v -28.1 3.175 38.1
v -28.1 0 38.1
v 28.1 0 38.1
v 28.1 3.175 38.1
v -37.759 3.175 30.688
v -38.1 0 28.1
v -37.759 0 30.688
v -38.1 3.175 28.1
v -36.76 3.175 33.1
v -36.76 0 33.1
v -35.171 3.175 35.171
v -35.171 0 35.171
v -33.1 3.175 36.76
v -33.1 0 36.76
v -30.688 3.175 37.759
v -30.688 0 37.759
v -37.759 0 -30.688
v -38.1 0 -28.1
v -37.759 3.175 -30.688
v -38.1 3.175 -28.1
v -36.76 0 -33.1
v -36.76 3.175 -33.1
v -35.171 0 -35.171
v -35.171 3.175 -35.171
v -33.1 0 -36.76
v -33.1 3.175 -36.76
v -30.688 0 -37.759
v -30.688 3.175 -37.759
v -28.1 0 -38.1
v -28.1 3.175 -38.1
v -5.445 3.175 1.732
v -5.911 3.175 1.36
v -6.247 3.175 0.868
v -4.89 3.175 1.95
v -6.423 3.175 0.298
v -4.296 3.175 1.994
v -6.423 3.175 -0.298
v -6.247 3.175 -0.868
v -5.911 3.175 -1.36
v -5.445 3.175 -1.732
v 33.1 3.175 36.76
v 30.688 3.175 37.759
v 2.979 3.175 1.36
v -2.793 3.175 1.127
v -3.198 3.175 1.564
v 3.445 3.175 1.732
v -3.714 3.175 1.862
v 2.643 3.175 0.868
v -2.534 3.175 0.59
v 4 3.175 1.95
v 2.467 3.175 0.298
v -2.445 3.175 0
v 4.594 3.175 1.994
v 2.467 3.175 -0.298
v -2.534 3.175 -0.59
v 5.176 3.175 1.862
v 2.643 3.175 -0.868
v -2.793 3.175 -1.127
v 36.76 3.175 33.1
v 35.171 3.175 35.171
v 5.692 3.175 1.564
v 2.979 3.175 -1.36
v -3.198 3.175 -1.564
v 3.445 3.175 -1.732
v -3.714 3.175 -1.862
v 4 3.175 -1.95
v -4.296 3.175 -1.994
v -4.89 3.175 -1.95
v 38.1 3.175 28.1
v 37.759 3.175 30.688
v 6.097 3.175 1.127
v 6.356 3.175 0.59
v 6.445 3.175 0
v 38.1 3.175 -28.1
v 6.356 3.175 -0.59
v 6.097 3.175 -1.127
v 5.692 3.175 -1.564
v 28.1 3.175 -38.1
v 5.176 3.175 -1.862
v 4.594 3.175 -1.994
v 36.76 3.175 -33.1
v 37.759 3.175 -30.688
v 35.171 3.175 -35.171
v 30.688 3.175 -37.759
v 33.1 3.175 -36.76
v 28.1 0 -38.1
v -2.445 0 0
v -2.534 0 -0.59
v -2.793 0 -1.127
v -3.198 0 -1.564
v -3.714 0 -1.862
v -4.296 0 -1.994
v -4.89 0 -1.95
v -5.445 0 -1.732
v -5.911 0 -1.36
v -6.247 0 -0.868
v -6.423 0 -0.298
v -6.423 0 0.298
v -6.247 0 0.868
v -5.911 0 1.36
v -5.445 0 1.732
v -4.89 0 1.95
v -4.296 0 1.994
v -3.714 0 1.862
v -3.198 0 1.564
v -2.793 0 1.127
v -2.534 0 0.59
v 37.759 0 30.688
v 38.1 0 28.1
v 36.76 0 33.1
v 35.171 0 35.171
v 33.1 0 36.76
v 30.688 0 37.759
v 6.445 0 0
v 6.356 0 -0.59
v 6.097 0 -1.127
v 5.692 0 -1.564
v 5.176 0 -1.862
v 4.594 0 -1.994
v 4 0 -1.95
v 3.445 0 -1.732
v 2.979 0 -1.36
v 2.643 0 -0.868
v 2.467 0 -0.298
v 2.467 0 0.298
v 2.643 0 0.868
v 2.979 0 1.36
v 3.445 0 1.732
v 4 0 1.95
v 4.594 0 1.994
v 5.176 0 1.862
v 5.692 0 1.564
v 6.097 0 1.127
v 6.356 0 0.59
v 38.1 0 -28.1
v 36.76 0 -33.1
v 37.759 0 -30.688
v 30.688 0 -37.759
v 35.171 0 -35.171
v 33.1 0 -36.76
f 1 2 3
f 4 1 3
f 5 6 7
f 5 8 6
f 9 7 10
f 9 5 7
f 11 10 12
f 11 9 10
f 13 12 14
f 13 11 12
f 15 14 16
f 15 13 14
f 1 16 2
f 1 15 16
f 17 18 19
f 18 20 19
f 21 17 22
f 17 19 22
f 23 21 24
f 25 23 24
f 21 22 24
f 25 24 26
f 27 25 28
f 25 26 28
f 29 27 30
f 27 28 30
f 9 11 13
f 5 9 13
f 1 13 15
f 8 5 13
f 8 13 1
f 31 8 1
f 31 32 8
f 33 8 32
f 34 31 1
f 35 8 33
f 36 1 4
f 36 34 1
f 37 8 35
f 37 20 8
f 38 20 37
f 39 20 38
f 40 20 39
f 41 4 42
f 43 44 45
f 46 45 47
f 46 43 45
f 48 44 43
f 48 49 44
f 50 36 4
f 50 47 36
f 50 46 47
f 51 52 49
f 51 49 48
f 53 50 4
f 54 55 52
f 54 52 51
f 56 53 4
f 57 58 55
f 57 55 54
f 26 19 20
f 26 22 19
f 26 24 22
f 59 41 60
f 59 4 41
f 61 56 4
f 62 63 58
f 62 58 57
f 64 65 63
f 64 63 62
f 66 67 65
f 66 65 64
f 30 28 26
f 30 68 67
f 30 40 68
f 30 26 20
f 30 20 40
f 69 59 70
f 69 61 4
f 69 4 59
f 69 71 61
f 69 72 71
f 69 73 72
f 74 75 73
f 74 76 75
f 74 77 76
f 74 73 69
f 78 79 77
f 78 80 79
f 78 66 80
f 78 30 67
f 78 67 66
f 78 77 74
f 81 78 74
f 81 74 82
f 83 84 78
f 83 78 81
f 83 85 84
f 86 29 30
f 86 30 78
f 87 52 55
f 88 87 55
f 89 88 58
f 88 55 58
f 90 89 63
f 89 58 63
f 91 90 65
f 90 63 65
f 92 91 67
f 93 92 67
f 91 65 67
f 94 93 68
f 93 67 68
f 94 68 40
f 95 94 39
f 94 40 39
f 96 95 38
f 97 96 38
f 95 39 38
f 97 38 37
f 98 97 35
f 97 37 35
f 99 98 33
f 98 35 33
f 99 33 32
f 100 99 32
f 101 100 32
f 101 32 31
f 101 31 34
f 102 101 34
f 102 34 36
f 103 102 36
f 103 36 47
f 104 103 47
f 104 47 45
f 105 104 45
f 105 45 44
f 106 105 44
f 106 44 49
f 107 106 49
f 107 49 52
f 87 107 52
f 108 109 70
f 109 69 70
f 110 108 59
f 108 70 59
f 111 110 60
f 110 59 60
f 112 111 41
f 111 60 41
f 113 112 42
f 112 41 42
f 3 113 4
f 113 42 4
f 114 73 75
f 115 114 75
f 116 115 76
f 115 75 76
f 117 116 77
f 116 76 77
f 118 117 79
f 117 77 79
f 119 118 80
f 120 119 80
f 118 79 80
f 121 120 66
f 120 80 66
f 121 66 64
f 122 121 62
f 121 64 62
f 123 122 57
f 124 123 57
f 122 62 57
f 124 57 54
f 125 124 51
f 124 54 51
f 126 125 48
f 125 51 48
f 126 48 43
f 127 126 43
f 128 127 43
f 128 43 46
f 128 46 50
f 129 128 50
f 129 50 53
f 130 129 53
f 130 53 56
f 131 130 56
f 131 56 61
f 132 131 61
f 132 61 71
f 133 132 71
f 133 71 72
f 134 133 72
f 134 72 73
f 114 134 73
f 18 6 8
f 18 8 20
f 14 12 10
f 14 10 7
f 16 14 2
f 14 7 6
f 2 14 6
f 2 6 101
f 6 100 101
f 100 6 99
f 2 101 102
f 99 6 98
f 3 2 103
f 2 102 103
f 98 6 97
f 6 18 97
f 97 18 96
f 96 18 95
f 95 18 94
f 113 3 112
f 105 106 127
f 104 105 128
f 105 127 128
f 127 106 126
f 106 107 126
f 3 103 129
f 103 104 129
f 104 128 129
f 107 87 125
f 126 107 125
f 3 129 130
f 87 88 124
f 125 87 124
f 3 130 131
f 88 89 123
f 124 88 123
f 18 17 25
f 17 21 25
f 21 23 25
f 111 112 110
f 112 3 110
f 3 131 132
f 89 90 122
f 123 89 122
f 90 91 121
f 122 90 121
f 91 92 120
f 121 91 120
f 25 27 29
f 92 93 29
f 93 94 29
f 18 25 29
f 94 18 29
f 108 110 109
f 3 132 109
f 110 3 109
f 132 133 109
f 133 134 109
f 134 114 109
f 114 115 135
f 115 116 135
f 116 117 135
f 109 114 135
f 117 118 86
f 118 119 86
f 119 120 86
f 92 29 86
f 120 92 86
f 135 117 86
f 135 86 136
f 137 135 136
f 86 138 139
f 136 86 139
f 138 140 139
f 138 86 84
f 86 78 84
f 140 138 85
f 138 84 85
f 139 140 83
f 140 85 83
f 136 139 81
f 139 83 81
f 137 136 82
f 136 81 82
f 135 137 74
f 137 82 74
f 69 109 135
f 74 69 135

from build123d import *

# Parameters (mm, degrees)
SKETCH1_W           = 76.2
SKETCH1_H           = 76.2
BOSS_EXTRUDE1_DEPTH = 3.175
FILLET1_R           = 10
FILLET2_R           = 10
FILLET3_R           = 10
FILLET4_R           = 10
SKETCH2_R           = 2
CUT_EXTRUDE1_DEPTH  = 4.175


with BuildPart() as part:
    # Sketch1 → Boss-Extrude1 (new body)
    with BuildSketch(Plane(origin=(0, 0, 0), x_dir=(1, 0, 0), z_dir=(0, 1, 0))):
        Rectangle(SKETCH1_W, SKETCH1_H)
    extrude(amount=BOSS_EXTRUDE1_DEPTH)

    # Fillet1
    fillet1_edges = [part.edges().sort_by_distance(p)[0] for p in [
        (-38.1, 1.5875, 38.1),
    ]]
    fillet(fillet1_edges, radius=FILLET1_R)

    # Fillet2
    fillet2_edges = [part.edges().sort_by_distance(p)[0] for p in [
        (-38.1, 1.5875, -38.1),
    ]]
    fillet(fillet2_edges, radius=FILLET2_R)

    # Fillet3
    fillet3_edges = [part.edges().sort_by_distance(p)[0] for p in [
        (38.1, 1.5875, -38.1),
    ]]
    fillet(fillet3_edges, radius=FILLET3_R)

    # Fillet4
    fillet4_edges = [part.edges().sort_by_distance(p)[0] for p in [
        (38.1, 1.5875, 38.1),
    ]]
    fillet(fillet4_edges, radius=FILLET4_R)

    # Sketch2 → Cut-Extrude1 (cut, through all)
    with BuildSketch(Plane(origin=(0, 3.175, 0), x_dir=(1, 0, 0), z_dir=(0, 1, 0))):
        with Locations((4.445, 0)):
            Circle(SKETCH2_R)
        with Locations((-4.445, 0)):
            Circle(SKETCH2_R)
    extrude(amount=-CUT_EXTRUDE1_DEPTH, mode=Mode.SUBTRACT)


solid = part.part
